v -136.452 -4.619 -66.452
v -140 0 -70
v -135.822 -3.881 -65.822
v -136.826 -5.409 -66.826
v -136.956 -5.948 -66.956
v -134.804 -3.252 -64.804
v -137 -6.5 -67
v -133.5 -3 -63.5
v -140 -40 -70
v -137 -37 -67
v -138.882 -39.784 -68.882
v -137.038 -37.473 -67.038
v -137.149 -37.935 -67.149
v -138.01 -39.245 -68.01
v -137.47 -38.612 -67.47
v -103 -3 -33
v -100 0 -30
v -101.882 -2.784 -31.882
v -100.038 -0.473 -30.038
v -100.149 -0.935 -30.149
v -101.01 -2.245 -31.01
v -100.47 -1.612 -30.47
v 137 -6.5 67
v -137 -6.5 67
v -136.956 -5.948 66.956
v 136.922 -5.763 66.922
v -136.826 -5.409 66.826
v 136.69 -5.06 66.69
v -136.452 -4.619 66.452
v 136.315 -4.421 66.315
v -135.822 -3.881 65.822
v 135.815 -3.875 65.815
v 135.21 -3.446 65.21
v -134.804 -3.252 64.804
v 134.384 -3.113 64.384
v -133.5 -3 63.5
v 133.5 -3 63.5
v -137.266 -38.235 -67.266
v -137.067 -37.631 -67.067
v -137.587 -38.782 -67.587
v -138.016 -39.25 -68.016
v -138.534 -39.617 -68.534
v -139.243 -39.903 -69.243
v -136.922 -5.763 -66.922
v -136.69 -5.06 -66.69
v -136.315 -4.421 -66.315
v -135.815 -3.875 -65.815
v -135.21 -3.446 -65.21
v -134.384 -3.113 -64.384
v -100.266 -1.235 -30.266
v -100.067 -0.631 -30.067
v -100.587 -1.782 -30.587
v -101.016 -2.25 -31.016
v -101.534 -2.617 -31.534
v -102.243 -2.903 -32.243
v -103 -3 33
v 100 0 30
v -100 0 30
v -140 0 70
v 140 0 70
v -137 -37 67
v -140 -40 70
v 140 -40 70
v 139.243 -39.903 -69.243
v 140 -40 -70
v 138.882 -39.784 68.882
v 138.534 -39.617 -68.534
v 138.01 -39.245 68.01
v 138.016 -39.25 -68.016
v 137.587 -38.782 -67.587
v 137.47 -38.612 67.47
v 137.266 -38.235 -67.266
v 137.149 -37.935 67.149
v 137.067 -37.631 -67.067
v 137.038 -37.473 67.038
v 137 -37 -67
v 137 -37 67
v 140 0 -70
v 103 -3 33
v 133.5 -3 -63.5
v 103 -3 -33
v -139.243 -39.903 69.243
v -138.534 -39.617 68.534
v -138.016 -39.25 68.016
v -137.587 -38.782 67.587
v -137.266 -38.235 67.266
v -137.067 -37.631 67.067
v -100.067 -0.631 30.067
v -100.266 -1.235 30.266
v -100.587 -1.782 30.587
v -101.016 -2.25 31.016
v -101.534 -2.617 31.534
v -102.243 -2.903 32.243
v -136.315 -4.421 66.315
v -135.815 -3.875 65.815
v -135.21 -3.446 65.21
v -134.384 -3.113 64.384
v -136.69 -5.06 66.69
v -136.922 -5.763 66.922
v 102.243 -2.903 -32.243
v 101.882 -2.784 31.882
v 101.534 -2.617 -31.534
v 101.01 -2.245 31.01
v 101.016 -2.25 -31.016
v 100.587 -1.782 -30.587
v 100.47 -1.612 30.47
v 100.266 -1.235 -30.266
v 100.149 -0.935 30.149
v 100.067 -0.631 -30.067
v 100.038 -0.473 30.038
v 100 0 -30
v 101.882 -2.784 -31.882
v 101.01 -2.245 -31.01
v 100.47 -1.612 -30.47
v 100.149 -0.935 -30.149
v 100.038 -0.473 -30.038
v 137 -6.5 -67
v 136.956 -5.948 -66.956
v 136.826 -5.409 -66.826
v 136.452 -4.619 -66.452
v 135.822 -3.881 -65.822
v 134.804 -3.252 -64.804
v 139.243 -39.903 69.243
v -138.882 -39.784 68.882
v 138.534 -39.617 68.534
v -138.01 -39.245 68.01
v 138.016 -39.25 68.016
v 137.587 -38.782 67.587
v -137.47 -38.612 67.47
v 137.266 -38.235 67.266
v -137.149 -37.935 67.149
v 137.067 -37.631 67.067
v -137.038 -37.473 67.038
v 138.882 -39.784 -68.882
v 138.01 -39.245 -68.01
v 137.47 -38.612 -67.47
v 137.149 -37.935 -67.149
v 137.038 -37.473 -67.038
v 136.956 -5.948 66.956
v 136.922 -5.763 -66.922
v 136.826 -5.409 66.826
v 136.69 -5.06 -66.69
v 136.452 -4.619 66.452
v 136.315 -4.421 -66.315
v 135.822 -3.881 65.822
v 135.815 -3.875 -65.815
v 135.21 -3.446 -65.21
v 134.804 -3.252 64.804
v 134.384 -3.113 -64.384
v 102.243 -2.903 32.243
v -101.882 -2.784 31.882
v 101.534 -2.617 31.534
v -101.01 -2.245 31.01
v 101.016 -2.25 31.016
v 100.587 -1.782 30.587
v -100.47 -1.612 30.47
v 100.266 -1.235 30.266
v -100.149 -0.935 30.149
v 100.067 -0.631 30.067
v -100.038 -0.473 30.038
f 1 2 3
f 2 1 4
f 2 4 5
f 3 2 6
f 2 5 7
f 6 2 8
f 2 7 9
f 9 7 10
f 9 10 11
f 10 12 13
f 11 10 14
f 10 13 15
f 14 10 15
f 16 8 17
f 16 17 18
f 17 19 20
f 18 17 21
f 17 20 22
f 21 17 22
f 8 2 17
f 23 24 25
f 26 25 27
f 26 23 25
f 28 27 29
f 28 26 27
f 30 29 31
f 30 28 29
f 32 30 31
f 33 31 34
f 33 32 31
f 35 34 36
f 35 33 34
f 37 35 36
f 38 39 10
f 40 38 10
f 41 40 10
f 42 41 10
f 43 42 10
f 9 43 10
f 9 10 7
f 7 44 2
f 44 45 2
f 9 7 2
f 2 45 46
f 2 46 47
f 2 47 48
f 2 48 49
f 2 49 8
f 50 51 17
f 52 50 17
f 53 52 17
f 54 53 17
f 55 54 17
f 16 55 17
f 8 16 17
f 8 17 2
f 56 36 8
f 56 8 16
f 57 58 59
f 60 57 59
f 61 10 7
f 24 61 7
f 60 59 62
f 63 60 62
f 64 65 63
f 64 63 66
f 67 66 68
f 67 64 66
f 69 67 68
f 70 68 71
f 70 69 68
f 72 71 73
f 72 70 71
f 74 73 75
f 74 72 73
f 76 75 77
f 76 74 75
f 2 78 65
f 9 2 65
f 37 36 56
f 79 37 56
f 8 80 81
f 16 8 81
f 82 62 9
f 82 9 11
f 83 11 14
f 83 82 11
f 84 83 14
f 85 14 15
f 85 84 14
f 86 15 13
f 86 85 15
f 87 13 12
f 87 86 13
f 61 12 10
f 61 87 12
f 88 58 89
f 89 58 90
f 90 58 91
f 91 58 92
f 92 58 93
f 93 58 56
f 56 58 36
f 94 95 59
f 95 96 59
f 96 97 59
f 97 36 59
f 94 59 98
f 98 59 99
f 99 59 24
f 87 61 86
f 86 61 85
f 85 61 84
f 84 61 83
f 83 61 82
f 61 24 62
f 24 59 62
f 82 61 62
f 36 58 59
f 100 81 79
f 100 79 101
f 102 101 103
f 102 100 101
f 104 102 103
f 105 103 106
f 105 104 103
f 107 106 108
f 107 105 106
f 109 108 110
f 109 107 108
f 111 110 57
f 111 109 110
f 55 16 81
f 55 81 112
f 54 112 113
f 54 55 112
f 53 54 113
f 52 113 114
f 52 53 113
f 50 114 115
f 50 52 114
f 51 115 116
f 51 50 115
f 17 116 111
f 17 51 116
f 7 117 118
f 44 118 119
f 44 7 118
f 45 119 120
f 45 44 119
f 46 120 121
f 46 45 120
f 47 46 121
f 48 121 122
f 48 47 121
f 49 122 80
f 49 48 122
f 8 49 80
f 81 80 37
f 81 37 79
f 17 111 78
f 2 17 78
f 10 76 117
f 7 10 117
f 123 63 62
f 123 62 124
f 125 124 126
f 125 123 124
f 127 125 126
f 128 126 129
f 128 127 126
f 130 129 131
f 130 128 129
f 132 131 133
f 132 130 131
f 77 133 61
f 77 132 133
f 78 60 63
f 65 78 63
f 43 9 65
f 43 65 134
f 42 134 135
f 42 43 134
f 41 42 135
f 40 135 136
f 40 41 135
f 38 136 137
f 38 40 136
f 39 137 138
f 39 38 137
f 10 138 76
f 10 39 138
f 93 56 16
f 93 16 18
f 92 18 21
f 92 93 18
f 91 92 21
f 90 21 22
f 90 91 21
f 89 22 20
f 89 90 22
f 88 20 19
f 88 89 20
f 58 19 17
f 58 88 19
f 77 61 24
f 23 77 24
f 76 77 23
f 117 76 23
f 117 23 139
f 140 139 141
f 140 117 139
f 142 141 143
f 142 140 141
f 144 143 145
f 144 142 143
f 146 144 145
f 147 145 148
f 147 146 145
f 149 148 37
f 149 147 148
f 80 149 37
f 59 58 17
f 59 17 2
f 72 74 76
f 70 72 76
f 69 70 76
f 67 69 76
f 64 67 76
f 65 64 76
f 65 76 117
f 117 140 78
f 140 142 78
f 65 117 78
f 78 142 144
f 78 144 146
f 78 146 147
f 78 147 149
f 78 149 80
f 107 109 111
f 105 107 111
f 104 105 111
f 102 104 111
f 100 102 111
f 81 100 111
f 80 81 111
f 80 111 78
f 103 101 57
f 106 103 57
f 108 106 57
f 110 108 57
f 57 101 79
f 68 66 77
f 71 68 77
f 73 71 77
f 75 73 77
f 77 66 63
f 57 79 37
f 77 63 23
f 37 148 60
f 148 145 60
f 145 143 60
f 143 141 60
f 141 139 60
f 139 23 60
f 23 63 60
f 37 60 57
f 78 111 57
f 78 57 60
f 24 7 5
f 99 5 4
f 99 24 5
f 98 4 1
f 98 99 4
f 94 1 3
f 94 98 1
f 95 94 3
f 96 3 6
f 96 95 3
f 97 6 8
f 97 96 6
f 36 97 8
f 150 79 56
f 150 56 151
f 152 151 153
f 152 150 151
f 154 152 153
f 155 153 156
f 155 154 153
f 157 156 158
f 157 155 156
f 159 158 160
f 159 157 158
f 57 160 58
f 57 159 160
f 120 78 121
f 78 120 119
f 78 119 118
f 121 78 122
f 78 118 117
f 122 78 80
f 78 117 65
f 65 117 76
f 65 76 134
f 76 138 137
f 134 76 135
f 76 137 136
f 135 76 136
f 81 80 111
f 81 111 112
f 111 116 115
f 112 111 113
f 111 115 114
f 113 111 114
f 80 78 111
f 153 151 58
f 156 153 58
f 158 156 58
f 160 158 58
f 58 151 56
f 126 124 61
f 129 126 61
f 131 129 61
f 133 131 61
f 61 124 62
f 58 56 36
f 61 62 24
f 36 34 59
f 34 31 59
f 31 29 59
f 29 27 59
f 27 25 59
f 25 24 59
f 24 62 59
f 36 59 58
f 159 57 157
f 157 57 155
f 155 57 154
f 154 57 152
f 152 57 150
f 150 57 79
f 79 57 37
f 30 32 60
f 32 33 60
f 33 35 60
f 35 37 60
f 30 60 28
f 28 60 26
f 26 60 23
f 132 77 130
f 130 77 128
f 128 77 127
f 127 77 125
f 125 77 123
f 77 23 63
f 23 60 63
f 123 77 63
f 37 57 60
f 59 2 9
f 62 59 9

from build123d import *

# Parameters (mm, degrees)
IRON_V40X40X3_1_DEPTH      = 197.568542495
IRON_V40X40X3_1_DEPTH_BACK = 57.568542495
IRON_V40X40X3_1_2_DEPTH    = 395.13708499
IRON_V40X40X3_1_3_DEPTH    = 255.13708499
IRON_V40X40X3_1_4_DEPTH    = 395.13708499


with BuildPart() as part:
    # Sketch1 → Iron V40X40X3(1) (new, two sides: drawn at the far end of the back side and taken through both)
    with BuildSketch(Plane(origin=(-140, 0, 70), x_dir=(1, 0, 0), z_dir=(0, 0, -1)).offset(-IRON_V40X40X3_1_DEPTH_BACK)):
        with BuildLine():
            Line((0, 0), (0, 40))
            ThreePointArc((0, 40), (2.121320344, 39.121320344), (3, 37))
            Line((3, 37), (3, 6.5))
            ThreePointArc((3, 6.5), (4.025126266, 4.025126266), (6.5, 3))
            Line((6.5, 3), (37, 3))
            ThreePointArc((37, 3), (39.121320344, 2.121320344), (40, 0))
            Line((40, 0), (0, 0))
        make_face()
    extrude(amount=IRON_V40X40X3_1_DEPTH + IRON_V40X40X3_1_DEPTH_BACK)

    # Iron V40X40X3(1) mitre 1
    split(bisect_by=Plane(origin=(-140, 0, 70), x_dir=(0, -1, 0), z_dir=(-0.707106781, 0, -0.707106781)), keep=Keep.TOP)

    # Iron V40X40X3(1) mitre 2
    split(bisect_by=Plane(origin=(-140, 0, -70), x_dir=(0, -1, 0), z_dir=(-0.707106781, 0, 0.707106781)), keep=Keep.TOP)


with BuildPart() as body_2:
    # Sketch1 on segment 2 (carried to segment 2) → Iron V40X40X3_1 2 (new body)
    with BuildSketch(Plane(origin=(-197.568542495, 0, -70), x_dir=(0, 0, 1), z_dir=(1, 0, 0))):
        with BuildLine():
            Line((0, 0), (0, 40))
            ThreePointArc((0, 40), (2.121320344, 39.121320344), (3, 37))
            Line((3, 37), (3, 6.5))
            ThreePointArc((3, 6.5), (4.025126266, 4.025126266), (6.5, 3))
            Line((6.5, 3), (37, 3))
            ThreePointArc((37, 3), (39.121320344, 2.121320344), (40, 0))
            Line((40, 0), (0, 0))
        make_face()
    extrude(amount=IRON_V40X40X3_1_2_DEPTH)

    # Iron V40X40X3_1 2 mitre 1
    split(bisect_by=Plane(origin=(-140, 0, -70), x_dir=(0, 1, 0), z_dir=(0.707106781, 0, -0.707106781)), keep=Keep.TOP)

    # Iron V40X40X3_1 2 mitre 2
    split(bisect_by=Plane(origin=(140, 0, -70), x_dir=(0, -1, 0), z_dir=(-0.707106781, 0, -0.707106781)), keep=Keep.TOP)


with BuildPart() as body_3:
    # Sketch1 on segment 3 (carried to segment 3) → Iron V40X40X3_1 3 (new body)
    with BuildSketch(Plane(origin=(140, 0, -127.568542495), x_dir=(-1, 0, 0), z_dir=(0, 0, 1))):
        with BuildLine():
            Line((0, 0), (0, 40))
            ThreePointArc((0, 40), (2.121320344, 39.121320344), (3, 37))
            Line((3, 37), (3, 6.5))
            ThreePointArc((3, 6.5), (4.025126266, 4.025126266), (6.5, 3))
            Line((6.5, 3), (37, 3))
            ThreePointArc((37, 3), (39.121320344, 2.121320344), (40, 0))
            Line((40, 0), (0, 0))
        make_face()
    extrude(amount=IRON_V40X40X3_1_3_DEPTH)

    # Iron V40X40X3_1 3 mitre 1
    split(bisect_by=Plane(origin=(140, 0, 70), x_dir=(0, 1, 0), z_dir=(0.707106781, 0, -0.707106781)), keep=Keep.TOP)

    # Iron V40X40X3_1 3 mitre 2
    split(bisect_by=Plane(origin=(140, 0, -70), x_dir=(0, 1, 0), z_dir=(0.707106781, 0, 0.707106781)), keep=Keep.TOP)


with BuildPart() as body_4:
    # Sketch1 on segment 4 (carried to segment 4) → Iron V40X40X3_1 4 (new body)
    with BuildSketch(Plane(origin=(197.568542495, 0, 70), x_dir=(0, 0, -1), z_dir=(-1, 0, 0))):
        with BuildLine():
            Line((0, 0), (0, 40))
            ThreePointArc((0, 40), (2.121320344, 39.121320344), (3, 37))
            Line((3, 37), (3, 6.5))
            ThreePointArc((3, 6.5), (4.025126266, 4.025126266), (6.5, 3))
            Line((6.5, 3), (37, 3))
            ThreePointArc((37, 3), (39.121320344, 2.121320344), (40, 0))
            Line((40, 0), (0, 0))
        make_face()
    extrude(amount=IRON_V40X40X3_1_4_DEPTH)

    # Iron V40X40X3_1 4 mitre 1
    split(bisect_by=Plane(origin=(-140, 0, 70), x_dir=(0, 1, 0), z_dir=(0.707106781, 0, 0.707106781)), keep=Keep.TOP)

    # Iron V40X40X3_1 4 mitre 2
    split(bisect_by=Plane(origin=(140, 0, 70), x_dir=(0, -1, 0), z_dir=(-0.707106781, 0, 0.707106781)), keep=Keep.TOP)


solid = Compound([part.part, body_2.part, body_3.part, body_4.part])
